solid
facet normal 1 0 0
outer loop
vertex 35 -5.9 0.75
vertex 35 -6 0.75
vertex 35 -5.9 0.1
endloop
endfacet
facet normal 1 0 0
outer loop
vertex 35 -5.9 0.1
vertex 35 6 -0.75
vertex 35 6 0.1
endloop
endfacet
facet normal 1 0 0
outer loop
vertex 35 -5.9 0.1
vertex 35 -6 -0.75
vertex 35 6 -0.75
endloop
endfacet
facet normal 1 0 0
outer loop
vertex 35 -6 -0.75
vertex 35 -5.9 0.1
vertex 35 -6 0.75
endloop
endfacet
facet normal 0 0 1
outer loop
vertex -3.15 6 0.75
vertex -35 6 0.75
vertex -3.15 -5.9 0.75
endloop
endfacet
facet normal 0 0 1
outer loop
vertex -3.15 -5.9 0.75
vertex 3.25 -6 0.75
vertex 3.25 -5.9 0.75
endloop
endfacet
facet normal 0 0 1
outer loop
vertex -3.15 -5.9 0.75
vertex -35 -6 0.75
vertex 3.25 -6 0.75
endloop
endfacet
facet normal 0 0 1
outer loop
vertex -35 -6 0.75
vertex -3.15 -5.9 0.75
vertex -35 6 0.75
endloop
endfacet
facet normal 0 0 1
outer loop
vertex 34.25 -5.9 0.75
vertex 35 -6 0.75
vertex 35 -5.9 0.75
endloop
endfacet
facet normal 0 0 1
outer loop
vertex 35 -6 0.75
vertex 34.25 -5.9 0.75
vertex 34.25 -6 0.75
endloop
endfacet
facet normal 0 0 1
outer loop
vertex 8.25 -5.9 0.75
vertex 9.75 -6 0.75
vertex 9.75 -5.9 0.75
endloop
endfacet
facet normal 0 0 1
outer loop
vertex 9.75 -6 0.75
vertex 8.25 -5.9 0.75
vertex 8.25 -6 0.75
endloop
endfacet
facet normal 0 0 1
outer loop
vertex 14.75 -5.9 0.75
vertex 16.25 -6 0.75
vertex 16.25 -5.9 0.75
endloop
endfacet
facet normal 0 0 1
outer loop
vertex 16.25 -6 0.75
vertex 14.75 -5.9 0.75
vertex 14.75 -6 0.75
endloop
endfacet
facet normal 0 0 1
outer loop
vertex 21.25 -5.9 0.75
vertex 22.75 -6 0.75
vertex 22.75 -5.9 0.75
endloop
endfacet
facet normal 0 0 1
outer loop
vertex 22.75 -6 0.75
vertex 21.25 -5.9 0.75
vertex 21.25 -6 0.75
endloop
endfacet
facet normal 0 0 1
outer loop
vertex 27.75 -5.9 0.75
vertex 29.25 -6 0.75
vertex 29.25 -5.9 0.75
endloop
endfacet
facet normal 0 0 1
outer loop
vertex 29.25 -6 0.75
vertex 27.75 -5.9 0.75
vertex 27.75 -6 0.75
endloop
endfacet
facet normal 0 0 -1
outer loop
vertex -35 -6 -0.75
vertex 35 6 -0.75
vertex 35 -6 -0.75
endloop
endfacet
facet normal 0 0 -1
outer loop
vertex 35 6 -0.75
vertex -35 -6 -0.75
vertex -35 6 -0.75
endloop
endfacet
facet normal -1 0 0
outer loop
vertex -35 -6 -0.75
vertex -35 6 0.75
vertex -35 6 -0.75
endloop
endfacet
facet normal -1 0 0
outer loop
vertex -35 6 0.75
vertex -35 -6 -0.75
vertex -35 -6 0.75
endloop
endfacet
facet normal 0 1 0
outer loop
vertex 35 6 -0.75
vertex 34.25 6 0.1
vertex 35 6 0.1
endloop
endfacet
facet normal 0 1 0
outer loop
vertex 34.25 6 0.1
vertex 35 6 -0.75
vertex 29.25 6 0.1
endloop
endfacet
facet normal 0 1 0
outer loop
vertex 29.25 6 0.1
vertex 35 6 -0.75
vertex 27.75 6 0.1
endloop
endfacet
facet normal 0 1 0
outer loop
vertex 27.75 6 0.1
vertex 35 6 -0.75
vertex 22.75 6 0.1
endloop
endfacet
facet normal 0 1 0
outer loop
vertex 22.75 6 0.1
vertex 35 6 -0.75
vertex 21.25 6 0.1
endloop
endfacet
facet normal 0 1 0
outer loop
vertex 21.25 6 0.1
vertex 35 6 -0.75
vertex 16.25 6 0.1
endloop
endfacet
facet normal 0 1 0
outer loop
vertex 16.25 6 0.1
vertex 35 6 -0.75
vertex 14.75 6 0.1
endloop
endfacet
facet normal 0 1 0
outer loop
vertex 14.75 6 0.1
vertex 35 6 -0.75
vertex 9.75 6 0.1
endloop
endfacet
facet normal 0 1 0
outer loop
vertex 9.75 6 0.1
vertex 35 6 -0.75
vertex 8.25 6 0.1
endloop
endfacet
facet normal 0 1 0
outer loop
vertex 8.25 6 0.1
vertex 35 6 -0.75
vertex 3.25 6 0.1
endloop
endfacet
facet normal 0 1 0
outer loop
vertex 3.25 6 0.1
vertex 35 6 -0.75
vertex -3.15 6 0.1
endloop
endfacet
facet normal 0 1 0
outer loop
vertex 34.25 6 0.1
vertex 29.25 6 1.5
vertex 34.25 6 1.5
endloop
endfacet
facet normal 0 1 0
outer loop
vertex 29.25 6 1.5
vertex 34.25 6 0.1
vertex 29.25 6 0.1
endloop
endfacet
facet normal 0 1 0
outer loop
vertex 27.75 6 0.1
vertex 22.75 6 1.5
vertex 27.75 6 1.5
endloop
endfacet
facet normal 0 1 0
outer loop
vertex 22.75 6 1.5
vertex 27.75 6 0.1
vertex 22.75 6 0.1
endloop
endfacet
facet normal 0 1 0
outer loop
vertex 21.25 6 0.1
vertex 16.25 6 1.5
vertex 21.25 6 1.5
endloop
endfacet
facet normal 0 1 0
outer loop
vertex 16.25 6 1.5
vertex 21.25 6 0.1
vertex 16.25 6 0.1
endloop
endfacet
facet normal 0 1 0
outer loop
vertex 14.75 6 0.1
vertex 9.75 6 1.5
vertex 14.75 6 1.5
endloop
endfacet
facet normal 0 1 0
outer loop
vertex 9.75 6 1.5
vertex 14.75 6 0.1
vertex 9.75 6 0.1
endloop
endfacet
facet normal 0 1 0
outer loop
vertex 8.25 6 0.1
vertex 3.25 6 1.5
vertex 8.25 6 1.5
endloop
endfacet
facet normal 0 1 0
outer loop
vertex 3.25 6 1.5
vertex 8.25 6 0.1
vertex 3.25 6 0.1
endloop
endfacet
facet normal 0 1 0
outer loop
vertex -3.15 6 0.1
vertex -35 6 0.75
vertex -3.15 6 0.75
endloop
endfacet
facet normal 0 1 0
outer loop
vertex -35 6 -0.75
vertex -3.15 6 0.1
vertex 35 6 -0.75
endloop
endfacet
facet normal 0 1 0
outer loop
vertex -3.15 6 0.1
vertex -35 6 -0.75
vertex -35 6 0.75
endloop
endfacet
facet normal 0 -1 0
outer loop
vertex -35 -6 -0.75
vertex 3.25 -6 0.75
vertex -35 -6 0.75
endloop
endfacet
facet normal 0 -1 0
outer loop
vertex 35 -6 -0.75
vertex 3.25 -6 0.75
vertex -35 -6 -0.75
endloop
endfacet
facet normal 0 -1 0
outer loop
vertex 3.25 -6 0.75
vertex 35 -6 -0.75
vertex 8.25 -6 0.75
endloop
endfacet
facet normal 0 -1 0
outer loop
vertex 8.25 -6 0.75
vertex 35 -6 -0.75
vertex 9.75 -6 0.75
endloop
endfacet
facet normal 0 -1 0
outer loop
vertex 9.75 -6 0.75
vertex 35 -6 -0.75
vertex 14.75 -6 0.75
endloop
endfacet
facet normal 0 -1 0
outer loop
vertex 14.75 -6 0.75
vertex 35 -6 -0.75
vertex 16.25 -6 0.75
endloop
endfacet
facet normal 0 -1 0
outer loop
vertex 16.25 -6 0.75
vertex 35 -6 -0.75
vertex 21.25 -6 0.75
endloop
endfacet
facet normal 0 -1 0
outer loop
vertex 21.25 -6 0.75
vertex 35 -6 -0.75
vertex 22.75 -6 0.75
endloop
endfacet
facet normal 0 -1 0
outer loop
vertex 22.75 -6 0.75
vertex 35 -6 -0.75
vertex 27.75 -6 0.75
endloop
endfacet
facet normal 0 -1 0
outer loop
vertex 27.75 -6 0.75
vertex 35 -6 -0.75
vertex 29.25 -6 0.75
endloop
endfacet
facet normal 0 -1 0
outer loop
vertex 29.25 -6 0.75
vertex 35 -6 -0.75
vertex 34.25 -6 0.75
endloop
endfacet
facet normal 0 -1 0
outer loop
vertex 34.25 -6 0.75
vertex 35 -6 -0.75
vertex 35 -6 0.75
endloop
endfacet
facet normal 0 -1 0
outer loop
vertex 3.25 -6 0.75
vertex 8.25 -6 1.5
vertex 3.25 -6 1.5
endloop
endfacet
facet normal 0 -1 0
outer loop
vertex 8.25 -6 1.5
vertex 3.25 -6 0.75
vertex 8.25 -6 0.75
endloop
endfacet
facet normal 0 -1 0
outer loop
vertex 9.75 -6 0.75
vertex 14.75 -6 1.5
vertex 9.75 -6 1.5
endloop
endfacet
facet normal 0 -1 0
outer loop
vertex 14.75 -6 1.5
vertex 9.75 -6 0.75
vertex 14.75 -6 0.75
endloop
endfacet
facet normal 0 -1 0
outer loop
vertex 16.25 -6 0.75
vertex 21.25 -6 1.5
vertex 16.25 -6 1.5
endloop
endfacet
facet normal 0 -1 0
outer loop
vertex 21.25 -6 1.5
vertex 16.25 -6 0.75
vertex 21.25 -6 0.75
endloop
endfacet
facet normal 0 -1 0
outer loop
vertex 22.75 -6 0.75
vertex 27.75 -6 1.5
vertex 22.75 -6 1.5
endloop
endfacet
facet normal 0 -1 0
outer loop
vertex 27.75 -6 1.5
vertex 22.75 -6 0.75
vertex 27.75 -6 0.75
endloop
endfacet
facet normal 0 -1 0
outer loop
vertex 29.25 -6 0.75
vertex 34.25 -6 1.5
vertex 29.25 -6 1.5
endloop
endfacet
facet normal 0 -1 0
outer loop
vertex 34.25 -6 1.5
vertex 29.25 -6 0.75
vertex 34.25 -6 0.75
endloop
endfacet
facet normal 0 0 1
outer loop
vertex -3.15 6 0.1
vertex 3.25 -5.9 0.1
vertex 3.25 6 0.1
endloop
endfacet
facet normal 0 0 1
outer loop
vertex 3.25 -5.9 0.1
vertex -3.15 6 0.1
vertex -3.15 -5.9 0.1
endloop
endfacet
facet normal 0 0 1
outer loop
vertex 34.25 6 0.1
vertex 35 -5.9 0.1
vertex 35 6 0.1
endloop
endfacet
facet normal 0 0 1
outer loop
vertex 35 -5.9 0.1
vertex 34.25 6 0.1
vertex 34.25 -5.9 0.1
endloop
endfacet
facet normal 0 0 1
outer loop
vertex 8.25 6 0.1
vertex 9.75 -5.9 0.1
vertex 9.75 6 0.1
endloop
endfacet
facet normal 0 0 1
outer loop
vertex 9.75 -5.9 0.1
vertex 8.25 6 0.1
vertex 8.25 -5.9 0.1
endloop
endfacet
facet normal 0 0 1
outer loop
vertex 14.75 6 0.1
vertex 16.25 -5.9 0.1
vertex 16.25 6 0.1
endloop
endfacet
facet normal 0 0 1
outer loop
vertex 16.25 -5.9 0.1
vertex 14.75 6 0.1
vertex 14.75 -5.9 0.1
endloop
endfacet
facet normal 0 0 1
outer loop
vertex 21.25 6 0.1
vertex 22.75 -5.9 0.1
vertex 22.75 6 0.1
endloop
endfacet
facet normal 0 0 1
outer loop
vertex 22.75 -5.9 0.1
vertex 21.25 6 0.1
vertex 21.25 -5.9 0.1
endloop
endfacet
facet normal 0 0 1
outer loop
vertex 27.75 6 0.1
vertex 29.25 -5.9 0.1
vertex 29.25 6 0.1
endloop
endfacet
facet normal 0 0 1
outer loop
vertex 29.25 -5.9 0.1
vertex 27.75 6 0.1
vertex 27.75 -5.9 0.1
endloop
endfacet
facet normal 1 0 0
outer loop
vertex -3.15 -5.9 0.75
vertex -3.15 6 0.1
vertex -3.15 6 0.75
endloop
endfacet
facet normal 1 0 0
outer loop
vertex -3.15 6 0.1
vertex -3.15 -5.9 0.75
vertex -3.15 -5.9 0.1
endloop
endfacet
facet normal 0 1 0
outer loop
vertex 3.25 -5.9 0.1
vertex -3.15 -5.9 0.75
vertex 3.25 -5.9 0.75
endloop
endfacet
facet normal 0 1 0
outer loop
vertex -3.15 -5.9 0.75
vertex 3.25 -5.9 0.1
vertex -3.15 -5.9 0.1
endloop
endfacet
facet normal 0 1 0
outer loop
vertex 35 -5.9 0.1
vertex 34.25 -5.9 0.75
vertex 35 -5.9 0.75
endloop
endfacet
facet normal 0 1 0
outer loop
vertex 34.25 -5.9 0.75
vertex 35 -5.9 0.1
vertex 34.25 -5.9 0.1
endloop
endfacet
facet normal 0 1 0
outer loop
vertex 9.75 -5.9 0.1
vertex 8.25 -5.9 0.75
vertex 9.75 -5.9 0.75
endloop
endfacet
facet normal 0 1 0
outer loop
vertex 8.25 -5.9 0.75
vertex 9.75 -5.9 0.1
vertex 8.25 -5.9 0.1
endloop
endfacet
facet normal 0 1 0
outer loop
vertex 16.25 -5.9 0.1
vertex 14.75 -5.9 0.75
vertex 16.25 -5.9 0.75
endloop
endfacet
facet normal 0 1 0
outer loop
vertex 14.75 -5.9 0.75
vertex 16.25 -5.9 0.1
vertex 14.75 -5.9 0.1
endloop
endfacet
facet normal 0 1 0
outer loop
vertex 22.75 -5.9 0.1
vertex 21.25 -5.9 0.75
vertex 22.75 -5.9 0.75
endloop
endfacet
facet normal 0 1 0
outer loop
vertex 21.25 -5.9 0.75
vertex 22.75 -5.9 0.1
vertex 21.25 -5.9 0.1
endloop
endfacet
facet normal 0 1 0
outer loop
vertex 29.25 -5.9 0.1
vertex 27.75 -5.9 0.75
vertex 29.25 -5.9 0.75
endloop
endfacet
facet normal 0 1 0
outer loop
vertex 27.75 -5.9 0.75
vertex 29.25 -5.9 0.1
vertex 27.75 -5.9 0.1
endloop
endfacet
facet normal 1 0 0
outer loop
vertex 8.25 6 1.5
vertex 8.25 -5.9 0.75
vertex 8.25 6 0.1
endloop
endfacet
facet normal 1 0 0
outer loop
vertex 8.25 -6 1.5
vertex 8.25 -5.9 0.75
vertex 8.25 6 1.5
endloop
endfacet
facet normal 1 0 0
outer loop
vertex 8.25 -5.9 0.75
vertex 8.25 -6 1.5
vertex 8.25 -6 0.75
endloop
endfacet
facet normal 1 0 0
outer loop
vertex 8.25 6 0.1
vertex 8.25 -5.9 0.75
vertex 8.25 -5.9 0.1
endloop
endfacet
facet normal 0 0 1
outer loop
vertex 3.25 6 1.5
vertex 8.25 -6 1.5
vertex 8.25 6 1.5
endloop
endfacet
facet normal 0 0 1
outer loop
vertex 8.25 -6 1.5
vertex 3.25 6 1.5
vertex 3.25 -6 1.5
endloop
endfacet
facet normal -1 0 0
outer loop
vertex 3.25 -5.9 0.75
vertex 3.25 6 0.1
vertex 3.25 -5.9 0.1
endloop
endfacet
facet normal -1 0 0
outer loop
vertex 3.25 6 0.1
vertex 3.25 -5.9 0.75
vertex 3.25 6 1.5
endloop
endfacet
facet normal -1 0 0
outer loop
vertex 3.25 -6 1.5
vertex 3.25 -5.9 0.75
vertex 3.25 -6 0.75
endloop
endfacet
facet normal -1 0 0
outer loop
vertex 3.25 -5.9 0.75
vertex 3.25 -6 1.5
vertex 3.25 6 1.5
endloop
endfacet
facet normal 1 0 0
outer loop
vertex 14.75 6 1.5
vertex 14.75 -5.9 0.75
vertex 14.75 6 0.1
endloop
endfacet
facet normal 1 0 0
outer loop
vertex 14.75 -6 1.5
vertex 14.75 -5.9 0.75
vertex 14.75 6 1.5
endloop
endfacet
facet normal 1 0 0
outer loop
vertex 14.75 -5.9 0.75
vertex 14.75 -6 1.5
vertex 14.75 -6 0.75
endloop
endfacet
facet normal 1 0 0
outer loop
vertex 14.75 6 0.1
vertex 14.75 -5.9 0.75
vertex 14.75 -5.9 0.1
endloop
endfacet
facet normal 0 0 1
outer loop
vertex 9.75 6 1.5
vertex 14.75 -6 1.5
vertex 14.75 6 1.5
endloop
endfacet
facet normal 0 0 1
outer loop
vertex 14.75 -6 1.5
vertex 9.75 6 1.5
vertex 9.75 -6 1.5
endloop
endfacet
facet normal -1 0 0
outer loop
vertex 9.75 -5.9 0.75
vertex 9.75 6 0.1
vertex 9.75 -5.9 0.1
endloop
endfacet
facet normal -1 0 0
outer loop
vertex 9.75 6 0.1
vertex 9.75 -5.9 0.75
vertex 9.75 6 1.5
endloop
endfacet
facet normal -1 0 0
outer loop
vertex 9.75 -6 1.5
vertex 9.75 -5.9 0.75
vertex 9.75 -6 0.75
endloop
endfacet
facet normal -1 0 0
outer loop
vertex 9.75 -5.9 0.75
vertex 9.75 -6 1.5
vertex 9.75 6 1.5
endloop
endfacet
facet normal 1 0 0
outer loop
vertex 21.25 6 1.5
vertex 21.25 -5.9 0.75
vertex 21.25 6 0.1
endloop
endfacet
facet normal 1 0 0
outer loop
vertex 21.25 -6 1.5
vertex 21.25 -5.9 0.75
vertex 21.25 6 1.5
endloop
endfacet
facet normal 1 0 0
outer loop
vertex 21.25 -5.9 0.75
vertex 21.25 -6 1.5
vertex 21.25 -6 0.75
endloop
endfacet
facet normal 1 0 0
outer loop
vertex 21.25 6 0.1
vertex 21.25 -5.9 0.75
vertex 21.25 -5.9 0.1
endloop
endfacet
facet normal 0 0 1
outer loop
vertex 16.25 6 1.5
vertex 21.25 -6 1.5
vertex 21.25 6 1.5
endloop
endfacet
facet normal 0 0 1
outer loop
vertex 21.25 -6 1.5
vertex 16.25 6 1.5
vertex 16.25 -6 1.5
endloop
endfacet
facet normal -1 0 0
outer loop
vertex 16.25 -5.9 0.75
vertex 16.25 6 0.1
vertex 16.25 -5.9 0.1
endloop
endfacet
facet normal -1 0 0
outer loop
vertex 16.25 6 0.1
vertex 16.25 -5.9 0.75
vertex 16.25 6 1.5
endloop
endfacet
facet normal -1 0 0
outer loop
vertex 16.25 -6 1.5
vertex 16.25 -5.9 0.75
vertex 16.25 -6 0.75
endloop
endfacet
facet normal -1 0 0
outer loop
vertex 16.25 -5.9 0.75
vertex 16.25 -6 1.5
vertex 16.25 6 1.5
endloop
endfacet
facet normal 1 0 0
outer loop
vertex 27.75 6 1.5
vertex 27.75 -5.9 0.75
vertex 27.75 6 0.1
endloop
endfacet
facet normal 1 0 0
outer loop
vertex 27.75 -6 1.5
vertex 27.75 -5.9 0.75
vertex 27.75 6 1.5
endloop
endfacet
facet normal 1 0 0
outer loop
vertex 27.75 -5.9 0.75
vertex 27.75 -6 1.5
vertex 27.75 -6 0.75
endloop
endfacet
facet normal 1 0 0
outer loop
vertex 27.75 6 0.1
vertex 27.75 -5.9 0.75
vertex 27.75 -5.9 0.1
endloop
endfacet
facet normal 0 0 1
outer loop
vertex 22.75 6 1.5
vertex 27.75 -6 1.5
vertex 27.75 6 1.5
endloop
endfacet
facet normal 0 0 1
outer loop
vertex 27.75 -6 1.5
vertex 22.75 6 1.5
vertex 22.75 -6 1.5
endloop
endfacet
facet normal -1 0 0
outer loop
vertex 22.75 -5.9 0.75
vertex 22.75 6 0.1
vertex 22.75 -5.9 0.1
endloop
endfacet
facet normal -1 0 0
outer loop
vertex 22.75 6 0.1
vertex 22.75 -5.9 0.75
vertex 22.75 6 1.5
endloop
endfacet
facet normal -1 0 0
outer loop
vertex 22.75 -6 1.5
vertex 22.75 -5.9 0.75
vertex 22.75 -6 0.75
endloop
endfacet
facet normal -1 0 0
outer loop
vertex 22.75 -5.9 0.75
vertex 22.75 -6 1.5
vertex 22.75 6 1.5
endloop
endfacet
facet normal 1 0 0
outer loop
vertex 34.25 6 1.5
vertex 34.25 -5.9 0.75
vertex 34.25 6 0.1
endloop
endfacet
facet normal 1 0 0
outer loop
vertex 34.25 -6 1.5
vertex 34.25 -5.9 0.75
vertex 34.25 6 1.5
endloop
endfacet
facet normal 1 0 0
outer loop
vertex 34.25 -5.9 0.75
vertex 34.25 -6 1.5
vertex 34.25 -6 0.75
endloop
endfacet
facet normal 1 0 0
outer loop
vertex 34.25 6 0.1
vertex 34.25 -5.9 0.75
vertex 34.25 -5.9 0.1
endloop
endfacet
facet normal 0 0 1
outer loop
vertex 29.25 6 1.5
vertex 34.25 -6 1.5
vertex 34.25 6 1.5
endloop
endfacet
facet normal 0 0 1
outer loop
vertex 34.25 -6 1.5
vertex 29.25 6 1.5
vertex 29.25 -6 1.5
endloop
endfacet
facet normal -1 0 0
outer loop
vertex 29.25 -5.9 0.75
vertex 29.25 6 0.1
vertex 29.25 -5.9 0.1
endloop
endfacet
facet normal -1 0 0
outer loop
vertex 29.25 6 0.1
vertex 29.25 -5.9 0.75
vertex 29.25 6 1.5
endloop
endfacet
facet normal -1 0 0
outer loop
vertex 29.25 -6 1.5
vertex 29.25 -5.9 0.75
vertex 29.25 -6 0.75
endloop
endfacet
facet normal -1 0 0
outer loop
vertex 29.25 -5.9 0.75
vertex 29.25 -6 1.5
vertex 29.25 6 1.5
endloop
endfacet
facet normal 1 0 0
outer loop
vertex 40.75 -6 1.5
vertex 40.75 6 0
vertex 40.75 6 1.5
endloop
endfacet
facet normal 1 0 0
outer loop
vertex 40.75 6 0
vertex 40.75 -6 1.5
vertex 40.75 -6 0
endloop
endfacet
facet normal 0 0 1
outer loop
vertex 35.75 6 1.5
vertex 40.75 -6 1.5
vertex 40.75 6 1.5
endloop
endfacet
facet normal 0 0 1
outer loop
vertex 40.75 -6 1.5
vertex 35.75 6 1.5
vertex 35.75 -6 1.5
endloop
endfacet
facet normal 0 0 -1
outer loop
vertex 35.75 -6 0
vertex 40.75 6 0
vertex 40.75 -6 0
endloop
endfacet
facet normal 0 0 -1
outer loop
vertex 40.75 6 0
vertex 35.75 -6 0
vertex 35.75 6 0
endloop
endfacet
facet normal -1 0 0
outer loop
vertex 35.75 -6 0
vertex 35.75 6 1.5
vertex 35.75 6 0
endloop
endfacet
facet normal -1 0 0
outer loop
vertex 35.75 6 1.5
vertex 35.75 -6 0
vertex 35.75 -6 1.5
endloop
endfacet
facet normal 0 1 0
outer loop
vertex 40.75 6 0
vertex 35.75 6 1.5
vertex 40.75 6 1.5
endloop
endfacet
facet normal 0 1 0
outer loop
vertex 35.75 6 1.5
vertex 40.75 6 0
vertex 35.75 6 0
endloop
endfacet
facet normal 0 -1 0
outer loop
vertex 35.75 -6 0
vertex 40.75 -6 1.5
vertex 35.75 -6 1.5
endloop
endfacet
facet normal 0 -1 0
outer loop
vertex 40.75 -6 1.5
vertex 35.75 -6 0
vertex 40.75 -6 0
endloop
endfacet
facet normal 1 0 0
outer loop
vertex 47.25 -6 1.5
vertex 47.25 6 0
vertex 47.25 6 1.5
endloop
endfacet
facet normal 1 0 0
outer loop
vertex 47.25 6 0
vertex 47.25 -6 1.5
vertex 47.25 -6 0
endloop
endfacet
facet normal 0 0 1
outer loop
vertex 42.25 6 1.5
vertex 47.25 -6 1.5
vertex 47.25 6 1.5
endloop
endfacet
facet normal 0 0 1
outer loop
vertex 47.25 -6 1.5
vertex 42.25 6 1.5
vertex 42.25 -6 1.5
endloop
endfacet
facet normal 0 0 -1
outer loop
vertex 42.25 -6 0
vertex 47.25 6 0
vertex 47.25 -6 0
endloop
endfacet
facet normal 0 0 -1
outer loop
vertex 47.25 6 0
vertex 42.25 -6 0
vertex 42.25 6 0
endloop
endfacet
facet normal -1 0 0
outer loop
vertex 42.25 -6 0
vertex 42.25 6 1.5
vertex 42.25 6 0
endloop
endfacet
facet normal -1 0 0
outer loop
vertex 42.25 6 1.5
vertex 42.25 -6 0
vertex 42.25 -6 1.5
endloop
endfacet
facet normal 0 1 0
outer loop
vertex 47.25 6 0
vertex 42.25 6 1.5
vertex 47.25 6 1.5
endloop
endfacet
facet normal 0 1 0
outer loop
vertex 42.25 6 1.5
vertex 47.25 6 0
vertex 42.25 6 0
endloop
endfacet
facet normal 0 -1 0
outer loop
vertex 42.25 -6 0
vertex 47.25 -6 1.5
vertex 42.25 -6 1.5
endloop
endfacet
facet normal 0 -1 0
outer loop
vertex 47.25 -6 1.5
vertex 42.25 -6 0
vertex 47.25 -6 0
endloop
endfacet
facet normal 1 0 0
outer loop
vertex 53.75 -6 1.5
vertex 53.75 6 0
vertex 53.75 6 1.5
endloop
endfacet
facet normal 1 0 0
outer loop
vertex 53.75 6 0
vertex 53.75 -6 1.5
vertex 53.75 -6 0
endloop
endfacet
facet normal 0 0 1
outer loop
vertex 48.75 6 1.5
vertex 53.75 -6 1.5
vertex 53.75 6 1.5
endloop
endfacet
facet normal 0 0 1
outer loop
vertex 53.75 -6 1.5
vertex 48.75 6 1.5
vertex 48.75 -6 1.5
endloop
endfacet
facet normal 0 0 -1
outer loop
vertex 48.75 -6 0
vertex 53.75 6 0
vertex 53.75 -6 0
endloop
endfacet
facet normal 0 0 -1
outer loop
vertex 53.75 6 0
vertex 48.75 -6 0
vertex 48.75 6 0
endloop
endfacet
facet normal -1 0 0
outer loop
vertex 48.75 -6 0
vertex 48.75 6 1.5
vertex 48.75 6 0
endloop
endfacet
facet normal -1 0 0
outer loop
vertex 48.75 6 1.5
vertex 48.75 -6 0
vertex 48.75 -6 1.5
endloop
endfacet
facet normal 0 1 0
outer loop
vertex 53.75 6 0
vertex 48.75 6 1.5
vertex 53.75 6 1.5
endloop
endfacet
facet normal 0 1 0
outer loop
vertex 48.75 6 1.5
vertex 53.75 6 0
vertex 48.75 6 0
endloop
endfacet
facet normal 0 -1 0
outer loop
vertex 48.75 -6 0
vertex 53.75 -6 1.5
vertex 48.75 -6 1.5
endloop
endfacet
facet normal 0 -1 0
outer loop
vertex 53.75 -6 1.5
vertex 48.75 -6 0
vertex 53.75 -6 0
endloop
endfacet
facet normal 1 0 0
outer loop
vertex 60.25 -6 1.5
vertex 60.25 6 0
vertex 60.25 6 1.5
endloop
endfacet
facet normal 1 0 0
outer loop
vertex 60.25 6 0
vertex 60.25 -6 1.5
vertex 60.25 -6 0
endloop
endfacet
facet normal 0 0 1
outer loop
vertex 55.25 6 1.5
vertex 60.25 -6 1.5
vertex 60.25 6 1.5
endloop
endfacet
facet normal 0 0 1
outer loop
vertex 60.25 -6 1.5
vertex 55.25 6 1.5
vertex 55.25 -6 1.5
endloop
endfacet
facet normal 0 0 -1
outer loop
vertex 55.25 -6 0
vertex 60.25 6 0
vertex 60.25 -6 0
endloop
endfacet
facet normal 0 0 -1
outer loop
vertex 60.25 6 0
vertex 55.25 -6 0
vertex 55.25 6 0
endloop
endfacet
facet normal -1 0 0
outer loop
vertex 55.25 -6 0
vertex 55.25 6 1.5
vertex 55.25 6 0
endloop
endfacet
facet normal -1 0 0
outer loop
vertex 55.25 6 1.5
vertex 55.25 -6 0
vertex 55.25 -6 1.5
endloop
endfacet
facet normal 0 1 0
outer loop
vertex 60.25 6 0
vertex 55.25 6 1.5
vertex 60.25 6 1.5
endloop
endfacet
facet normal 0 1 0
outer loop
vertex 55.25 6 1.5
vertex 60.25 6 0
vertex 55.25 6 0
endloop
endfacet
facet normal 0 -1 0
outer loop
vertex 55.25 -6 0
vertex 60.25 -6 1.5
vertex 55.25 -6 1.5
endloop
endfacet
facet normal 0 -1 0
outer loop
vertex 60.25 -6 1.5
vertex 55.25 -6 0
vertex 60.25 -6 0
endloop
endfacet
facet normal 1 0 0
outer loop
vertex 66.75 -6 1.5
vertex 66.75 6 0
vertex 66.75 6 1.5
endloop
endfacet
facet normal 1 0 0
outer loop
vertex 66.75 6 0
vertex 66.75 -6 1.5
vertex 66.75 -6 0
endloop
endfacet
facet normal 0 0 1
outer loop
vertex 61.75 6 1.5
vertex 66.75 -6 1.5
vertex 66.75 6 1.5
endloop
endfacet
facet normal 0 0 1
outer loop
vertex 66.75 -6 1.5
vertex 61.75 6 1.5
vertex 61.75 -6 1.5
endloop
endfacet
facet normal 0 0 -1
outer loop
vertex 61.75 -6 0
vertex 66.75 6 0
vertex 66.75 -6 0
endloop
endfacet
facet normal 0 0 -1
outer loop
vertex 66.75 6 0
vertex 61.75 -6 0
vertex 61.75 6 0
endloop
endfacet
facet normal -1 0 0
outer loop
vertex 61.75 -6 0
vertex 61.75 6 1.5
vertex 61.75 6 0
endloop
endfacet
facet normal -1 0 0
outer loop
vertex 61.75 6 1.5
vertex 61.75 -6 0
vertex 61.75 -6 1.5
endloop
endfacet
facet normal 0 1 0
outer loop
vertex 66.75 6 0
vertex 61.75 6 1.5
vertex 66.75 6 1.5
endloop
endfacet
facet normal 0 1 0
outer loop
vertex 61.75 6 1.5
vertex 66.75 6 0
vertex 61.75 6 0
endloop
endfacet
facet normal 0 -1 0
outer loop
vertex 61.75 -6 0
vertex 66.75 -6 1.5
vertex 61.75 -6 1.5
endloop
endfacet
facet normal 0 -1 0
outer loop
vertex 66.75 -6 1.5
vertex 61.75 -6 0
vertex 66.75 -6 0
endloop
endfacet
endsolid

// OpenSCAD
// 10-well Agarose Gel Comb
// Designed for FDM printing, lying flat on the XY plane (Z=0).
// Dimensions in millimetres.

// --- Dimensions ---
// Spine (Back Bar)
$spine_length = 70;   // X dimension
$spine_width = 12;    // Y dimension
$plate_thickness = 1.5; // Z dimension

// Teeth
$num_teeth = 10;
$tooth_width = 5.0;   // X dimension
$tooth_length = 12;   // Y dimension (extends from spine edge)
$gap_size = 1.5;      // Gap between teeth

// --- Calculations ---
// Total width of the teeth row
$total_teeth_width = $num_teeth * $tooth_width;
// Total width of the gaps
$total_gap_width = ($num_teeth - 1) * $gap_size;
// Total width of the tooth row including gaps
$tooth_row_width = $total_teeth_width + $total_gap_width;

// Centering offset in X to align the tooth row with the spine
// Spine is 70mm wide, Tooth Row is ~61.5mm wide.
// Offset = (Spine - ToothRow) / 2
$x_offset = ($spine_length - $tooth_row_width) / 2;

// Position of the spine edge from which teeth hang (-Y direction)
// Spine is 12mm wide. Teeth hang from the bottom edge (Y = -6).
$spine_bottom_y = -$spine_width / 2;
$tooth_start_y = $spine_bottom_y;
$tooth_end_y = $tooth_start_y - $tooth_length;

// --- Main Body (Spine) ---
// The spine is a flat plate 70x12x1.5
difference() {
    // Main block
    cube([
        $spine_length, 
        $spine_width, 
        $plate_thickness
    ], center = true);
    
    // Cut out the area where teeth will be attached to create a clean separation
    // We cut a rectangle slightly larger than the tooth row to ensure separation
    translate([
        -($spine_length/2) + ($tooth_row_width/2) + 0.1, // Left edge of tooth row + clearance
        $spine_bottom_y + 0.1, // Top edge of spine + clearance
        0.1 // Just below surface
    ])
    cube([
        $tooth_row_width + 0.2,
        $tooth_length + 0.2,
        $plate_thickness + 0.2
    ]);
}

// --- Teeth ---
// Loop to generate 10 teeth
for (i = [0 : $num_teeth - 1]) {
    // Calculate X position for this tooth
    // Start at x_offset, add tooth_width and gap_size for each previous tooth
    $current_x = $x_offset + ($tooth_width + $gap_size) * i;
    
    // Translate to position
    translate([
        $current_x, 
        $tooth_start_y, 
        0
    ])
    // Tooth is a rectangular prism: width x length x thickness
    // Width is X, Length is -Y, Thickness is Z
    cube([
        $tooth_width,
        $tooth_length,
        $plate_thickness
    ]);
}
